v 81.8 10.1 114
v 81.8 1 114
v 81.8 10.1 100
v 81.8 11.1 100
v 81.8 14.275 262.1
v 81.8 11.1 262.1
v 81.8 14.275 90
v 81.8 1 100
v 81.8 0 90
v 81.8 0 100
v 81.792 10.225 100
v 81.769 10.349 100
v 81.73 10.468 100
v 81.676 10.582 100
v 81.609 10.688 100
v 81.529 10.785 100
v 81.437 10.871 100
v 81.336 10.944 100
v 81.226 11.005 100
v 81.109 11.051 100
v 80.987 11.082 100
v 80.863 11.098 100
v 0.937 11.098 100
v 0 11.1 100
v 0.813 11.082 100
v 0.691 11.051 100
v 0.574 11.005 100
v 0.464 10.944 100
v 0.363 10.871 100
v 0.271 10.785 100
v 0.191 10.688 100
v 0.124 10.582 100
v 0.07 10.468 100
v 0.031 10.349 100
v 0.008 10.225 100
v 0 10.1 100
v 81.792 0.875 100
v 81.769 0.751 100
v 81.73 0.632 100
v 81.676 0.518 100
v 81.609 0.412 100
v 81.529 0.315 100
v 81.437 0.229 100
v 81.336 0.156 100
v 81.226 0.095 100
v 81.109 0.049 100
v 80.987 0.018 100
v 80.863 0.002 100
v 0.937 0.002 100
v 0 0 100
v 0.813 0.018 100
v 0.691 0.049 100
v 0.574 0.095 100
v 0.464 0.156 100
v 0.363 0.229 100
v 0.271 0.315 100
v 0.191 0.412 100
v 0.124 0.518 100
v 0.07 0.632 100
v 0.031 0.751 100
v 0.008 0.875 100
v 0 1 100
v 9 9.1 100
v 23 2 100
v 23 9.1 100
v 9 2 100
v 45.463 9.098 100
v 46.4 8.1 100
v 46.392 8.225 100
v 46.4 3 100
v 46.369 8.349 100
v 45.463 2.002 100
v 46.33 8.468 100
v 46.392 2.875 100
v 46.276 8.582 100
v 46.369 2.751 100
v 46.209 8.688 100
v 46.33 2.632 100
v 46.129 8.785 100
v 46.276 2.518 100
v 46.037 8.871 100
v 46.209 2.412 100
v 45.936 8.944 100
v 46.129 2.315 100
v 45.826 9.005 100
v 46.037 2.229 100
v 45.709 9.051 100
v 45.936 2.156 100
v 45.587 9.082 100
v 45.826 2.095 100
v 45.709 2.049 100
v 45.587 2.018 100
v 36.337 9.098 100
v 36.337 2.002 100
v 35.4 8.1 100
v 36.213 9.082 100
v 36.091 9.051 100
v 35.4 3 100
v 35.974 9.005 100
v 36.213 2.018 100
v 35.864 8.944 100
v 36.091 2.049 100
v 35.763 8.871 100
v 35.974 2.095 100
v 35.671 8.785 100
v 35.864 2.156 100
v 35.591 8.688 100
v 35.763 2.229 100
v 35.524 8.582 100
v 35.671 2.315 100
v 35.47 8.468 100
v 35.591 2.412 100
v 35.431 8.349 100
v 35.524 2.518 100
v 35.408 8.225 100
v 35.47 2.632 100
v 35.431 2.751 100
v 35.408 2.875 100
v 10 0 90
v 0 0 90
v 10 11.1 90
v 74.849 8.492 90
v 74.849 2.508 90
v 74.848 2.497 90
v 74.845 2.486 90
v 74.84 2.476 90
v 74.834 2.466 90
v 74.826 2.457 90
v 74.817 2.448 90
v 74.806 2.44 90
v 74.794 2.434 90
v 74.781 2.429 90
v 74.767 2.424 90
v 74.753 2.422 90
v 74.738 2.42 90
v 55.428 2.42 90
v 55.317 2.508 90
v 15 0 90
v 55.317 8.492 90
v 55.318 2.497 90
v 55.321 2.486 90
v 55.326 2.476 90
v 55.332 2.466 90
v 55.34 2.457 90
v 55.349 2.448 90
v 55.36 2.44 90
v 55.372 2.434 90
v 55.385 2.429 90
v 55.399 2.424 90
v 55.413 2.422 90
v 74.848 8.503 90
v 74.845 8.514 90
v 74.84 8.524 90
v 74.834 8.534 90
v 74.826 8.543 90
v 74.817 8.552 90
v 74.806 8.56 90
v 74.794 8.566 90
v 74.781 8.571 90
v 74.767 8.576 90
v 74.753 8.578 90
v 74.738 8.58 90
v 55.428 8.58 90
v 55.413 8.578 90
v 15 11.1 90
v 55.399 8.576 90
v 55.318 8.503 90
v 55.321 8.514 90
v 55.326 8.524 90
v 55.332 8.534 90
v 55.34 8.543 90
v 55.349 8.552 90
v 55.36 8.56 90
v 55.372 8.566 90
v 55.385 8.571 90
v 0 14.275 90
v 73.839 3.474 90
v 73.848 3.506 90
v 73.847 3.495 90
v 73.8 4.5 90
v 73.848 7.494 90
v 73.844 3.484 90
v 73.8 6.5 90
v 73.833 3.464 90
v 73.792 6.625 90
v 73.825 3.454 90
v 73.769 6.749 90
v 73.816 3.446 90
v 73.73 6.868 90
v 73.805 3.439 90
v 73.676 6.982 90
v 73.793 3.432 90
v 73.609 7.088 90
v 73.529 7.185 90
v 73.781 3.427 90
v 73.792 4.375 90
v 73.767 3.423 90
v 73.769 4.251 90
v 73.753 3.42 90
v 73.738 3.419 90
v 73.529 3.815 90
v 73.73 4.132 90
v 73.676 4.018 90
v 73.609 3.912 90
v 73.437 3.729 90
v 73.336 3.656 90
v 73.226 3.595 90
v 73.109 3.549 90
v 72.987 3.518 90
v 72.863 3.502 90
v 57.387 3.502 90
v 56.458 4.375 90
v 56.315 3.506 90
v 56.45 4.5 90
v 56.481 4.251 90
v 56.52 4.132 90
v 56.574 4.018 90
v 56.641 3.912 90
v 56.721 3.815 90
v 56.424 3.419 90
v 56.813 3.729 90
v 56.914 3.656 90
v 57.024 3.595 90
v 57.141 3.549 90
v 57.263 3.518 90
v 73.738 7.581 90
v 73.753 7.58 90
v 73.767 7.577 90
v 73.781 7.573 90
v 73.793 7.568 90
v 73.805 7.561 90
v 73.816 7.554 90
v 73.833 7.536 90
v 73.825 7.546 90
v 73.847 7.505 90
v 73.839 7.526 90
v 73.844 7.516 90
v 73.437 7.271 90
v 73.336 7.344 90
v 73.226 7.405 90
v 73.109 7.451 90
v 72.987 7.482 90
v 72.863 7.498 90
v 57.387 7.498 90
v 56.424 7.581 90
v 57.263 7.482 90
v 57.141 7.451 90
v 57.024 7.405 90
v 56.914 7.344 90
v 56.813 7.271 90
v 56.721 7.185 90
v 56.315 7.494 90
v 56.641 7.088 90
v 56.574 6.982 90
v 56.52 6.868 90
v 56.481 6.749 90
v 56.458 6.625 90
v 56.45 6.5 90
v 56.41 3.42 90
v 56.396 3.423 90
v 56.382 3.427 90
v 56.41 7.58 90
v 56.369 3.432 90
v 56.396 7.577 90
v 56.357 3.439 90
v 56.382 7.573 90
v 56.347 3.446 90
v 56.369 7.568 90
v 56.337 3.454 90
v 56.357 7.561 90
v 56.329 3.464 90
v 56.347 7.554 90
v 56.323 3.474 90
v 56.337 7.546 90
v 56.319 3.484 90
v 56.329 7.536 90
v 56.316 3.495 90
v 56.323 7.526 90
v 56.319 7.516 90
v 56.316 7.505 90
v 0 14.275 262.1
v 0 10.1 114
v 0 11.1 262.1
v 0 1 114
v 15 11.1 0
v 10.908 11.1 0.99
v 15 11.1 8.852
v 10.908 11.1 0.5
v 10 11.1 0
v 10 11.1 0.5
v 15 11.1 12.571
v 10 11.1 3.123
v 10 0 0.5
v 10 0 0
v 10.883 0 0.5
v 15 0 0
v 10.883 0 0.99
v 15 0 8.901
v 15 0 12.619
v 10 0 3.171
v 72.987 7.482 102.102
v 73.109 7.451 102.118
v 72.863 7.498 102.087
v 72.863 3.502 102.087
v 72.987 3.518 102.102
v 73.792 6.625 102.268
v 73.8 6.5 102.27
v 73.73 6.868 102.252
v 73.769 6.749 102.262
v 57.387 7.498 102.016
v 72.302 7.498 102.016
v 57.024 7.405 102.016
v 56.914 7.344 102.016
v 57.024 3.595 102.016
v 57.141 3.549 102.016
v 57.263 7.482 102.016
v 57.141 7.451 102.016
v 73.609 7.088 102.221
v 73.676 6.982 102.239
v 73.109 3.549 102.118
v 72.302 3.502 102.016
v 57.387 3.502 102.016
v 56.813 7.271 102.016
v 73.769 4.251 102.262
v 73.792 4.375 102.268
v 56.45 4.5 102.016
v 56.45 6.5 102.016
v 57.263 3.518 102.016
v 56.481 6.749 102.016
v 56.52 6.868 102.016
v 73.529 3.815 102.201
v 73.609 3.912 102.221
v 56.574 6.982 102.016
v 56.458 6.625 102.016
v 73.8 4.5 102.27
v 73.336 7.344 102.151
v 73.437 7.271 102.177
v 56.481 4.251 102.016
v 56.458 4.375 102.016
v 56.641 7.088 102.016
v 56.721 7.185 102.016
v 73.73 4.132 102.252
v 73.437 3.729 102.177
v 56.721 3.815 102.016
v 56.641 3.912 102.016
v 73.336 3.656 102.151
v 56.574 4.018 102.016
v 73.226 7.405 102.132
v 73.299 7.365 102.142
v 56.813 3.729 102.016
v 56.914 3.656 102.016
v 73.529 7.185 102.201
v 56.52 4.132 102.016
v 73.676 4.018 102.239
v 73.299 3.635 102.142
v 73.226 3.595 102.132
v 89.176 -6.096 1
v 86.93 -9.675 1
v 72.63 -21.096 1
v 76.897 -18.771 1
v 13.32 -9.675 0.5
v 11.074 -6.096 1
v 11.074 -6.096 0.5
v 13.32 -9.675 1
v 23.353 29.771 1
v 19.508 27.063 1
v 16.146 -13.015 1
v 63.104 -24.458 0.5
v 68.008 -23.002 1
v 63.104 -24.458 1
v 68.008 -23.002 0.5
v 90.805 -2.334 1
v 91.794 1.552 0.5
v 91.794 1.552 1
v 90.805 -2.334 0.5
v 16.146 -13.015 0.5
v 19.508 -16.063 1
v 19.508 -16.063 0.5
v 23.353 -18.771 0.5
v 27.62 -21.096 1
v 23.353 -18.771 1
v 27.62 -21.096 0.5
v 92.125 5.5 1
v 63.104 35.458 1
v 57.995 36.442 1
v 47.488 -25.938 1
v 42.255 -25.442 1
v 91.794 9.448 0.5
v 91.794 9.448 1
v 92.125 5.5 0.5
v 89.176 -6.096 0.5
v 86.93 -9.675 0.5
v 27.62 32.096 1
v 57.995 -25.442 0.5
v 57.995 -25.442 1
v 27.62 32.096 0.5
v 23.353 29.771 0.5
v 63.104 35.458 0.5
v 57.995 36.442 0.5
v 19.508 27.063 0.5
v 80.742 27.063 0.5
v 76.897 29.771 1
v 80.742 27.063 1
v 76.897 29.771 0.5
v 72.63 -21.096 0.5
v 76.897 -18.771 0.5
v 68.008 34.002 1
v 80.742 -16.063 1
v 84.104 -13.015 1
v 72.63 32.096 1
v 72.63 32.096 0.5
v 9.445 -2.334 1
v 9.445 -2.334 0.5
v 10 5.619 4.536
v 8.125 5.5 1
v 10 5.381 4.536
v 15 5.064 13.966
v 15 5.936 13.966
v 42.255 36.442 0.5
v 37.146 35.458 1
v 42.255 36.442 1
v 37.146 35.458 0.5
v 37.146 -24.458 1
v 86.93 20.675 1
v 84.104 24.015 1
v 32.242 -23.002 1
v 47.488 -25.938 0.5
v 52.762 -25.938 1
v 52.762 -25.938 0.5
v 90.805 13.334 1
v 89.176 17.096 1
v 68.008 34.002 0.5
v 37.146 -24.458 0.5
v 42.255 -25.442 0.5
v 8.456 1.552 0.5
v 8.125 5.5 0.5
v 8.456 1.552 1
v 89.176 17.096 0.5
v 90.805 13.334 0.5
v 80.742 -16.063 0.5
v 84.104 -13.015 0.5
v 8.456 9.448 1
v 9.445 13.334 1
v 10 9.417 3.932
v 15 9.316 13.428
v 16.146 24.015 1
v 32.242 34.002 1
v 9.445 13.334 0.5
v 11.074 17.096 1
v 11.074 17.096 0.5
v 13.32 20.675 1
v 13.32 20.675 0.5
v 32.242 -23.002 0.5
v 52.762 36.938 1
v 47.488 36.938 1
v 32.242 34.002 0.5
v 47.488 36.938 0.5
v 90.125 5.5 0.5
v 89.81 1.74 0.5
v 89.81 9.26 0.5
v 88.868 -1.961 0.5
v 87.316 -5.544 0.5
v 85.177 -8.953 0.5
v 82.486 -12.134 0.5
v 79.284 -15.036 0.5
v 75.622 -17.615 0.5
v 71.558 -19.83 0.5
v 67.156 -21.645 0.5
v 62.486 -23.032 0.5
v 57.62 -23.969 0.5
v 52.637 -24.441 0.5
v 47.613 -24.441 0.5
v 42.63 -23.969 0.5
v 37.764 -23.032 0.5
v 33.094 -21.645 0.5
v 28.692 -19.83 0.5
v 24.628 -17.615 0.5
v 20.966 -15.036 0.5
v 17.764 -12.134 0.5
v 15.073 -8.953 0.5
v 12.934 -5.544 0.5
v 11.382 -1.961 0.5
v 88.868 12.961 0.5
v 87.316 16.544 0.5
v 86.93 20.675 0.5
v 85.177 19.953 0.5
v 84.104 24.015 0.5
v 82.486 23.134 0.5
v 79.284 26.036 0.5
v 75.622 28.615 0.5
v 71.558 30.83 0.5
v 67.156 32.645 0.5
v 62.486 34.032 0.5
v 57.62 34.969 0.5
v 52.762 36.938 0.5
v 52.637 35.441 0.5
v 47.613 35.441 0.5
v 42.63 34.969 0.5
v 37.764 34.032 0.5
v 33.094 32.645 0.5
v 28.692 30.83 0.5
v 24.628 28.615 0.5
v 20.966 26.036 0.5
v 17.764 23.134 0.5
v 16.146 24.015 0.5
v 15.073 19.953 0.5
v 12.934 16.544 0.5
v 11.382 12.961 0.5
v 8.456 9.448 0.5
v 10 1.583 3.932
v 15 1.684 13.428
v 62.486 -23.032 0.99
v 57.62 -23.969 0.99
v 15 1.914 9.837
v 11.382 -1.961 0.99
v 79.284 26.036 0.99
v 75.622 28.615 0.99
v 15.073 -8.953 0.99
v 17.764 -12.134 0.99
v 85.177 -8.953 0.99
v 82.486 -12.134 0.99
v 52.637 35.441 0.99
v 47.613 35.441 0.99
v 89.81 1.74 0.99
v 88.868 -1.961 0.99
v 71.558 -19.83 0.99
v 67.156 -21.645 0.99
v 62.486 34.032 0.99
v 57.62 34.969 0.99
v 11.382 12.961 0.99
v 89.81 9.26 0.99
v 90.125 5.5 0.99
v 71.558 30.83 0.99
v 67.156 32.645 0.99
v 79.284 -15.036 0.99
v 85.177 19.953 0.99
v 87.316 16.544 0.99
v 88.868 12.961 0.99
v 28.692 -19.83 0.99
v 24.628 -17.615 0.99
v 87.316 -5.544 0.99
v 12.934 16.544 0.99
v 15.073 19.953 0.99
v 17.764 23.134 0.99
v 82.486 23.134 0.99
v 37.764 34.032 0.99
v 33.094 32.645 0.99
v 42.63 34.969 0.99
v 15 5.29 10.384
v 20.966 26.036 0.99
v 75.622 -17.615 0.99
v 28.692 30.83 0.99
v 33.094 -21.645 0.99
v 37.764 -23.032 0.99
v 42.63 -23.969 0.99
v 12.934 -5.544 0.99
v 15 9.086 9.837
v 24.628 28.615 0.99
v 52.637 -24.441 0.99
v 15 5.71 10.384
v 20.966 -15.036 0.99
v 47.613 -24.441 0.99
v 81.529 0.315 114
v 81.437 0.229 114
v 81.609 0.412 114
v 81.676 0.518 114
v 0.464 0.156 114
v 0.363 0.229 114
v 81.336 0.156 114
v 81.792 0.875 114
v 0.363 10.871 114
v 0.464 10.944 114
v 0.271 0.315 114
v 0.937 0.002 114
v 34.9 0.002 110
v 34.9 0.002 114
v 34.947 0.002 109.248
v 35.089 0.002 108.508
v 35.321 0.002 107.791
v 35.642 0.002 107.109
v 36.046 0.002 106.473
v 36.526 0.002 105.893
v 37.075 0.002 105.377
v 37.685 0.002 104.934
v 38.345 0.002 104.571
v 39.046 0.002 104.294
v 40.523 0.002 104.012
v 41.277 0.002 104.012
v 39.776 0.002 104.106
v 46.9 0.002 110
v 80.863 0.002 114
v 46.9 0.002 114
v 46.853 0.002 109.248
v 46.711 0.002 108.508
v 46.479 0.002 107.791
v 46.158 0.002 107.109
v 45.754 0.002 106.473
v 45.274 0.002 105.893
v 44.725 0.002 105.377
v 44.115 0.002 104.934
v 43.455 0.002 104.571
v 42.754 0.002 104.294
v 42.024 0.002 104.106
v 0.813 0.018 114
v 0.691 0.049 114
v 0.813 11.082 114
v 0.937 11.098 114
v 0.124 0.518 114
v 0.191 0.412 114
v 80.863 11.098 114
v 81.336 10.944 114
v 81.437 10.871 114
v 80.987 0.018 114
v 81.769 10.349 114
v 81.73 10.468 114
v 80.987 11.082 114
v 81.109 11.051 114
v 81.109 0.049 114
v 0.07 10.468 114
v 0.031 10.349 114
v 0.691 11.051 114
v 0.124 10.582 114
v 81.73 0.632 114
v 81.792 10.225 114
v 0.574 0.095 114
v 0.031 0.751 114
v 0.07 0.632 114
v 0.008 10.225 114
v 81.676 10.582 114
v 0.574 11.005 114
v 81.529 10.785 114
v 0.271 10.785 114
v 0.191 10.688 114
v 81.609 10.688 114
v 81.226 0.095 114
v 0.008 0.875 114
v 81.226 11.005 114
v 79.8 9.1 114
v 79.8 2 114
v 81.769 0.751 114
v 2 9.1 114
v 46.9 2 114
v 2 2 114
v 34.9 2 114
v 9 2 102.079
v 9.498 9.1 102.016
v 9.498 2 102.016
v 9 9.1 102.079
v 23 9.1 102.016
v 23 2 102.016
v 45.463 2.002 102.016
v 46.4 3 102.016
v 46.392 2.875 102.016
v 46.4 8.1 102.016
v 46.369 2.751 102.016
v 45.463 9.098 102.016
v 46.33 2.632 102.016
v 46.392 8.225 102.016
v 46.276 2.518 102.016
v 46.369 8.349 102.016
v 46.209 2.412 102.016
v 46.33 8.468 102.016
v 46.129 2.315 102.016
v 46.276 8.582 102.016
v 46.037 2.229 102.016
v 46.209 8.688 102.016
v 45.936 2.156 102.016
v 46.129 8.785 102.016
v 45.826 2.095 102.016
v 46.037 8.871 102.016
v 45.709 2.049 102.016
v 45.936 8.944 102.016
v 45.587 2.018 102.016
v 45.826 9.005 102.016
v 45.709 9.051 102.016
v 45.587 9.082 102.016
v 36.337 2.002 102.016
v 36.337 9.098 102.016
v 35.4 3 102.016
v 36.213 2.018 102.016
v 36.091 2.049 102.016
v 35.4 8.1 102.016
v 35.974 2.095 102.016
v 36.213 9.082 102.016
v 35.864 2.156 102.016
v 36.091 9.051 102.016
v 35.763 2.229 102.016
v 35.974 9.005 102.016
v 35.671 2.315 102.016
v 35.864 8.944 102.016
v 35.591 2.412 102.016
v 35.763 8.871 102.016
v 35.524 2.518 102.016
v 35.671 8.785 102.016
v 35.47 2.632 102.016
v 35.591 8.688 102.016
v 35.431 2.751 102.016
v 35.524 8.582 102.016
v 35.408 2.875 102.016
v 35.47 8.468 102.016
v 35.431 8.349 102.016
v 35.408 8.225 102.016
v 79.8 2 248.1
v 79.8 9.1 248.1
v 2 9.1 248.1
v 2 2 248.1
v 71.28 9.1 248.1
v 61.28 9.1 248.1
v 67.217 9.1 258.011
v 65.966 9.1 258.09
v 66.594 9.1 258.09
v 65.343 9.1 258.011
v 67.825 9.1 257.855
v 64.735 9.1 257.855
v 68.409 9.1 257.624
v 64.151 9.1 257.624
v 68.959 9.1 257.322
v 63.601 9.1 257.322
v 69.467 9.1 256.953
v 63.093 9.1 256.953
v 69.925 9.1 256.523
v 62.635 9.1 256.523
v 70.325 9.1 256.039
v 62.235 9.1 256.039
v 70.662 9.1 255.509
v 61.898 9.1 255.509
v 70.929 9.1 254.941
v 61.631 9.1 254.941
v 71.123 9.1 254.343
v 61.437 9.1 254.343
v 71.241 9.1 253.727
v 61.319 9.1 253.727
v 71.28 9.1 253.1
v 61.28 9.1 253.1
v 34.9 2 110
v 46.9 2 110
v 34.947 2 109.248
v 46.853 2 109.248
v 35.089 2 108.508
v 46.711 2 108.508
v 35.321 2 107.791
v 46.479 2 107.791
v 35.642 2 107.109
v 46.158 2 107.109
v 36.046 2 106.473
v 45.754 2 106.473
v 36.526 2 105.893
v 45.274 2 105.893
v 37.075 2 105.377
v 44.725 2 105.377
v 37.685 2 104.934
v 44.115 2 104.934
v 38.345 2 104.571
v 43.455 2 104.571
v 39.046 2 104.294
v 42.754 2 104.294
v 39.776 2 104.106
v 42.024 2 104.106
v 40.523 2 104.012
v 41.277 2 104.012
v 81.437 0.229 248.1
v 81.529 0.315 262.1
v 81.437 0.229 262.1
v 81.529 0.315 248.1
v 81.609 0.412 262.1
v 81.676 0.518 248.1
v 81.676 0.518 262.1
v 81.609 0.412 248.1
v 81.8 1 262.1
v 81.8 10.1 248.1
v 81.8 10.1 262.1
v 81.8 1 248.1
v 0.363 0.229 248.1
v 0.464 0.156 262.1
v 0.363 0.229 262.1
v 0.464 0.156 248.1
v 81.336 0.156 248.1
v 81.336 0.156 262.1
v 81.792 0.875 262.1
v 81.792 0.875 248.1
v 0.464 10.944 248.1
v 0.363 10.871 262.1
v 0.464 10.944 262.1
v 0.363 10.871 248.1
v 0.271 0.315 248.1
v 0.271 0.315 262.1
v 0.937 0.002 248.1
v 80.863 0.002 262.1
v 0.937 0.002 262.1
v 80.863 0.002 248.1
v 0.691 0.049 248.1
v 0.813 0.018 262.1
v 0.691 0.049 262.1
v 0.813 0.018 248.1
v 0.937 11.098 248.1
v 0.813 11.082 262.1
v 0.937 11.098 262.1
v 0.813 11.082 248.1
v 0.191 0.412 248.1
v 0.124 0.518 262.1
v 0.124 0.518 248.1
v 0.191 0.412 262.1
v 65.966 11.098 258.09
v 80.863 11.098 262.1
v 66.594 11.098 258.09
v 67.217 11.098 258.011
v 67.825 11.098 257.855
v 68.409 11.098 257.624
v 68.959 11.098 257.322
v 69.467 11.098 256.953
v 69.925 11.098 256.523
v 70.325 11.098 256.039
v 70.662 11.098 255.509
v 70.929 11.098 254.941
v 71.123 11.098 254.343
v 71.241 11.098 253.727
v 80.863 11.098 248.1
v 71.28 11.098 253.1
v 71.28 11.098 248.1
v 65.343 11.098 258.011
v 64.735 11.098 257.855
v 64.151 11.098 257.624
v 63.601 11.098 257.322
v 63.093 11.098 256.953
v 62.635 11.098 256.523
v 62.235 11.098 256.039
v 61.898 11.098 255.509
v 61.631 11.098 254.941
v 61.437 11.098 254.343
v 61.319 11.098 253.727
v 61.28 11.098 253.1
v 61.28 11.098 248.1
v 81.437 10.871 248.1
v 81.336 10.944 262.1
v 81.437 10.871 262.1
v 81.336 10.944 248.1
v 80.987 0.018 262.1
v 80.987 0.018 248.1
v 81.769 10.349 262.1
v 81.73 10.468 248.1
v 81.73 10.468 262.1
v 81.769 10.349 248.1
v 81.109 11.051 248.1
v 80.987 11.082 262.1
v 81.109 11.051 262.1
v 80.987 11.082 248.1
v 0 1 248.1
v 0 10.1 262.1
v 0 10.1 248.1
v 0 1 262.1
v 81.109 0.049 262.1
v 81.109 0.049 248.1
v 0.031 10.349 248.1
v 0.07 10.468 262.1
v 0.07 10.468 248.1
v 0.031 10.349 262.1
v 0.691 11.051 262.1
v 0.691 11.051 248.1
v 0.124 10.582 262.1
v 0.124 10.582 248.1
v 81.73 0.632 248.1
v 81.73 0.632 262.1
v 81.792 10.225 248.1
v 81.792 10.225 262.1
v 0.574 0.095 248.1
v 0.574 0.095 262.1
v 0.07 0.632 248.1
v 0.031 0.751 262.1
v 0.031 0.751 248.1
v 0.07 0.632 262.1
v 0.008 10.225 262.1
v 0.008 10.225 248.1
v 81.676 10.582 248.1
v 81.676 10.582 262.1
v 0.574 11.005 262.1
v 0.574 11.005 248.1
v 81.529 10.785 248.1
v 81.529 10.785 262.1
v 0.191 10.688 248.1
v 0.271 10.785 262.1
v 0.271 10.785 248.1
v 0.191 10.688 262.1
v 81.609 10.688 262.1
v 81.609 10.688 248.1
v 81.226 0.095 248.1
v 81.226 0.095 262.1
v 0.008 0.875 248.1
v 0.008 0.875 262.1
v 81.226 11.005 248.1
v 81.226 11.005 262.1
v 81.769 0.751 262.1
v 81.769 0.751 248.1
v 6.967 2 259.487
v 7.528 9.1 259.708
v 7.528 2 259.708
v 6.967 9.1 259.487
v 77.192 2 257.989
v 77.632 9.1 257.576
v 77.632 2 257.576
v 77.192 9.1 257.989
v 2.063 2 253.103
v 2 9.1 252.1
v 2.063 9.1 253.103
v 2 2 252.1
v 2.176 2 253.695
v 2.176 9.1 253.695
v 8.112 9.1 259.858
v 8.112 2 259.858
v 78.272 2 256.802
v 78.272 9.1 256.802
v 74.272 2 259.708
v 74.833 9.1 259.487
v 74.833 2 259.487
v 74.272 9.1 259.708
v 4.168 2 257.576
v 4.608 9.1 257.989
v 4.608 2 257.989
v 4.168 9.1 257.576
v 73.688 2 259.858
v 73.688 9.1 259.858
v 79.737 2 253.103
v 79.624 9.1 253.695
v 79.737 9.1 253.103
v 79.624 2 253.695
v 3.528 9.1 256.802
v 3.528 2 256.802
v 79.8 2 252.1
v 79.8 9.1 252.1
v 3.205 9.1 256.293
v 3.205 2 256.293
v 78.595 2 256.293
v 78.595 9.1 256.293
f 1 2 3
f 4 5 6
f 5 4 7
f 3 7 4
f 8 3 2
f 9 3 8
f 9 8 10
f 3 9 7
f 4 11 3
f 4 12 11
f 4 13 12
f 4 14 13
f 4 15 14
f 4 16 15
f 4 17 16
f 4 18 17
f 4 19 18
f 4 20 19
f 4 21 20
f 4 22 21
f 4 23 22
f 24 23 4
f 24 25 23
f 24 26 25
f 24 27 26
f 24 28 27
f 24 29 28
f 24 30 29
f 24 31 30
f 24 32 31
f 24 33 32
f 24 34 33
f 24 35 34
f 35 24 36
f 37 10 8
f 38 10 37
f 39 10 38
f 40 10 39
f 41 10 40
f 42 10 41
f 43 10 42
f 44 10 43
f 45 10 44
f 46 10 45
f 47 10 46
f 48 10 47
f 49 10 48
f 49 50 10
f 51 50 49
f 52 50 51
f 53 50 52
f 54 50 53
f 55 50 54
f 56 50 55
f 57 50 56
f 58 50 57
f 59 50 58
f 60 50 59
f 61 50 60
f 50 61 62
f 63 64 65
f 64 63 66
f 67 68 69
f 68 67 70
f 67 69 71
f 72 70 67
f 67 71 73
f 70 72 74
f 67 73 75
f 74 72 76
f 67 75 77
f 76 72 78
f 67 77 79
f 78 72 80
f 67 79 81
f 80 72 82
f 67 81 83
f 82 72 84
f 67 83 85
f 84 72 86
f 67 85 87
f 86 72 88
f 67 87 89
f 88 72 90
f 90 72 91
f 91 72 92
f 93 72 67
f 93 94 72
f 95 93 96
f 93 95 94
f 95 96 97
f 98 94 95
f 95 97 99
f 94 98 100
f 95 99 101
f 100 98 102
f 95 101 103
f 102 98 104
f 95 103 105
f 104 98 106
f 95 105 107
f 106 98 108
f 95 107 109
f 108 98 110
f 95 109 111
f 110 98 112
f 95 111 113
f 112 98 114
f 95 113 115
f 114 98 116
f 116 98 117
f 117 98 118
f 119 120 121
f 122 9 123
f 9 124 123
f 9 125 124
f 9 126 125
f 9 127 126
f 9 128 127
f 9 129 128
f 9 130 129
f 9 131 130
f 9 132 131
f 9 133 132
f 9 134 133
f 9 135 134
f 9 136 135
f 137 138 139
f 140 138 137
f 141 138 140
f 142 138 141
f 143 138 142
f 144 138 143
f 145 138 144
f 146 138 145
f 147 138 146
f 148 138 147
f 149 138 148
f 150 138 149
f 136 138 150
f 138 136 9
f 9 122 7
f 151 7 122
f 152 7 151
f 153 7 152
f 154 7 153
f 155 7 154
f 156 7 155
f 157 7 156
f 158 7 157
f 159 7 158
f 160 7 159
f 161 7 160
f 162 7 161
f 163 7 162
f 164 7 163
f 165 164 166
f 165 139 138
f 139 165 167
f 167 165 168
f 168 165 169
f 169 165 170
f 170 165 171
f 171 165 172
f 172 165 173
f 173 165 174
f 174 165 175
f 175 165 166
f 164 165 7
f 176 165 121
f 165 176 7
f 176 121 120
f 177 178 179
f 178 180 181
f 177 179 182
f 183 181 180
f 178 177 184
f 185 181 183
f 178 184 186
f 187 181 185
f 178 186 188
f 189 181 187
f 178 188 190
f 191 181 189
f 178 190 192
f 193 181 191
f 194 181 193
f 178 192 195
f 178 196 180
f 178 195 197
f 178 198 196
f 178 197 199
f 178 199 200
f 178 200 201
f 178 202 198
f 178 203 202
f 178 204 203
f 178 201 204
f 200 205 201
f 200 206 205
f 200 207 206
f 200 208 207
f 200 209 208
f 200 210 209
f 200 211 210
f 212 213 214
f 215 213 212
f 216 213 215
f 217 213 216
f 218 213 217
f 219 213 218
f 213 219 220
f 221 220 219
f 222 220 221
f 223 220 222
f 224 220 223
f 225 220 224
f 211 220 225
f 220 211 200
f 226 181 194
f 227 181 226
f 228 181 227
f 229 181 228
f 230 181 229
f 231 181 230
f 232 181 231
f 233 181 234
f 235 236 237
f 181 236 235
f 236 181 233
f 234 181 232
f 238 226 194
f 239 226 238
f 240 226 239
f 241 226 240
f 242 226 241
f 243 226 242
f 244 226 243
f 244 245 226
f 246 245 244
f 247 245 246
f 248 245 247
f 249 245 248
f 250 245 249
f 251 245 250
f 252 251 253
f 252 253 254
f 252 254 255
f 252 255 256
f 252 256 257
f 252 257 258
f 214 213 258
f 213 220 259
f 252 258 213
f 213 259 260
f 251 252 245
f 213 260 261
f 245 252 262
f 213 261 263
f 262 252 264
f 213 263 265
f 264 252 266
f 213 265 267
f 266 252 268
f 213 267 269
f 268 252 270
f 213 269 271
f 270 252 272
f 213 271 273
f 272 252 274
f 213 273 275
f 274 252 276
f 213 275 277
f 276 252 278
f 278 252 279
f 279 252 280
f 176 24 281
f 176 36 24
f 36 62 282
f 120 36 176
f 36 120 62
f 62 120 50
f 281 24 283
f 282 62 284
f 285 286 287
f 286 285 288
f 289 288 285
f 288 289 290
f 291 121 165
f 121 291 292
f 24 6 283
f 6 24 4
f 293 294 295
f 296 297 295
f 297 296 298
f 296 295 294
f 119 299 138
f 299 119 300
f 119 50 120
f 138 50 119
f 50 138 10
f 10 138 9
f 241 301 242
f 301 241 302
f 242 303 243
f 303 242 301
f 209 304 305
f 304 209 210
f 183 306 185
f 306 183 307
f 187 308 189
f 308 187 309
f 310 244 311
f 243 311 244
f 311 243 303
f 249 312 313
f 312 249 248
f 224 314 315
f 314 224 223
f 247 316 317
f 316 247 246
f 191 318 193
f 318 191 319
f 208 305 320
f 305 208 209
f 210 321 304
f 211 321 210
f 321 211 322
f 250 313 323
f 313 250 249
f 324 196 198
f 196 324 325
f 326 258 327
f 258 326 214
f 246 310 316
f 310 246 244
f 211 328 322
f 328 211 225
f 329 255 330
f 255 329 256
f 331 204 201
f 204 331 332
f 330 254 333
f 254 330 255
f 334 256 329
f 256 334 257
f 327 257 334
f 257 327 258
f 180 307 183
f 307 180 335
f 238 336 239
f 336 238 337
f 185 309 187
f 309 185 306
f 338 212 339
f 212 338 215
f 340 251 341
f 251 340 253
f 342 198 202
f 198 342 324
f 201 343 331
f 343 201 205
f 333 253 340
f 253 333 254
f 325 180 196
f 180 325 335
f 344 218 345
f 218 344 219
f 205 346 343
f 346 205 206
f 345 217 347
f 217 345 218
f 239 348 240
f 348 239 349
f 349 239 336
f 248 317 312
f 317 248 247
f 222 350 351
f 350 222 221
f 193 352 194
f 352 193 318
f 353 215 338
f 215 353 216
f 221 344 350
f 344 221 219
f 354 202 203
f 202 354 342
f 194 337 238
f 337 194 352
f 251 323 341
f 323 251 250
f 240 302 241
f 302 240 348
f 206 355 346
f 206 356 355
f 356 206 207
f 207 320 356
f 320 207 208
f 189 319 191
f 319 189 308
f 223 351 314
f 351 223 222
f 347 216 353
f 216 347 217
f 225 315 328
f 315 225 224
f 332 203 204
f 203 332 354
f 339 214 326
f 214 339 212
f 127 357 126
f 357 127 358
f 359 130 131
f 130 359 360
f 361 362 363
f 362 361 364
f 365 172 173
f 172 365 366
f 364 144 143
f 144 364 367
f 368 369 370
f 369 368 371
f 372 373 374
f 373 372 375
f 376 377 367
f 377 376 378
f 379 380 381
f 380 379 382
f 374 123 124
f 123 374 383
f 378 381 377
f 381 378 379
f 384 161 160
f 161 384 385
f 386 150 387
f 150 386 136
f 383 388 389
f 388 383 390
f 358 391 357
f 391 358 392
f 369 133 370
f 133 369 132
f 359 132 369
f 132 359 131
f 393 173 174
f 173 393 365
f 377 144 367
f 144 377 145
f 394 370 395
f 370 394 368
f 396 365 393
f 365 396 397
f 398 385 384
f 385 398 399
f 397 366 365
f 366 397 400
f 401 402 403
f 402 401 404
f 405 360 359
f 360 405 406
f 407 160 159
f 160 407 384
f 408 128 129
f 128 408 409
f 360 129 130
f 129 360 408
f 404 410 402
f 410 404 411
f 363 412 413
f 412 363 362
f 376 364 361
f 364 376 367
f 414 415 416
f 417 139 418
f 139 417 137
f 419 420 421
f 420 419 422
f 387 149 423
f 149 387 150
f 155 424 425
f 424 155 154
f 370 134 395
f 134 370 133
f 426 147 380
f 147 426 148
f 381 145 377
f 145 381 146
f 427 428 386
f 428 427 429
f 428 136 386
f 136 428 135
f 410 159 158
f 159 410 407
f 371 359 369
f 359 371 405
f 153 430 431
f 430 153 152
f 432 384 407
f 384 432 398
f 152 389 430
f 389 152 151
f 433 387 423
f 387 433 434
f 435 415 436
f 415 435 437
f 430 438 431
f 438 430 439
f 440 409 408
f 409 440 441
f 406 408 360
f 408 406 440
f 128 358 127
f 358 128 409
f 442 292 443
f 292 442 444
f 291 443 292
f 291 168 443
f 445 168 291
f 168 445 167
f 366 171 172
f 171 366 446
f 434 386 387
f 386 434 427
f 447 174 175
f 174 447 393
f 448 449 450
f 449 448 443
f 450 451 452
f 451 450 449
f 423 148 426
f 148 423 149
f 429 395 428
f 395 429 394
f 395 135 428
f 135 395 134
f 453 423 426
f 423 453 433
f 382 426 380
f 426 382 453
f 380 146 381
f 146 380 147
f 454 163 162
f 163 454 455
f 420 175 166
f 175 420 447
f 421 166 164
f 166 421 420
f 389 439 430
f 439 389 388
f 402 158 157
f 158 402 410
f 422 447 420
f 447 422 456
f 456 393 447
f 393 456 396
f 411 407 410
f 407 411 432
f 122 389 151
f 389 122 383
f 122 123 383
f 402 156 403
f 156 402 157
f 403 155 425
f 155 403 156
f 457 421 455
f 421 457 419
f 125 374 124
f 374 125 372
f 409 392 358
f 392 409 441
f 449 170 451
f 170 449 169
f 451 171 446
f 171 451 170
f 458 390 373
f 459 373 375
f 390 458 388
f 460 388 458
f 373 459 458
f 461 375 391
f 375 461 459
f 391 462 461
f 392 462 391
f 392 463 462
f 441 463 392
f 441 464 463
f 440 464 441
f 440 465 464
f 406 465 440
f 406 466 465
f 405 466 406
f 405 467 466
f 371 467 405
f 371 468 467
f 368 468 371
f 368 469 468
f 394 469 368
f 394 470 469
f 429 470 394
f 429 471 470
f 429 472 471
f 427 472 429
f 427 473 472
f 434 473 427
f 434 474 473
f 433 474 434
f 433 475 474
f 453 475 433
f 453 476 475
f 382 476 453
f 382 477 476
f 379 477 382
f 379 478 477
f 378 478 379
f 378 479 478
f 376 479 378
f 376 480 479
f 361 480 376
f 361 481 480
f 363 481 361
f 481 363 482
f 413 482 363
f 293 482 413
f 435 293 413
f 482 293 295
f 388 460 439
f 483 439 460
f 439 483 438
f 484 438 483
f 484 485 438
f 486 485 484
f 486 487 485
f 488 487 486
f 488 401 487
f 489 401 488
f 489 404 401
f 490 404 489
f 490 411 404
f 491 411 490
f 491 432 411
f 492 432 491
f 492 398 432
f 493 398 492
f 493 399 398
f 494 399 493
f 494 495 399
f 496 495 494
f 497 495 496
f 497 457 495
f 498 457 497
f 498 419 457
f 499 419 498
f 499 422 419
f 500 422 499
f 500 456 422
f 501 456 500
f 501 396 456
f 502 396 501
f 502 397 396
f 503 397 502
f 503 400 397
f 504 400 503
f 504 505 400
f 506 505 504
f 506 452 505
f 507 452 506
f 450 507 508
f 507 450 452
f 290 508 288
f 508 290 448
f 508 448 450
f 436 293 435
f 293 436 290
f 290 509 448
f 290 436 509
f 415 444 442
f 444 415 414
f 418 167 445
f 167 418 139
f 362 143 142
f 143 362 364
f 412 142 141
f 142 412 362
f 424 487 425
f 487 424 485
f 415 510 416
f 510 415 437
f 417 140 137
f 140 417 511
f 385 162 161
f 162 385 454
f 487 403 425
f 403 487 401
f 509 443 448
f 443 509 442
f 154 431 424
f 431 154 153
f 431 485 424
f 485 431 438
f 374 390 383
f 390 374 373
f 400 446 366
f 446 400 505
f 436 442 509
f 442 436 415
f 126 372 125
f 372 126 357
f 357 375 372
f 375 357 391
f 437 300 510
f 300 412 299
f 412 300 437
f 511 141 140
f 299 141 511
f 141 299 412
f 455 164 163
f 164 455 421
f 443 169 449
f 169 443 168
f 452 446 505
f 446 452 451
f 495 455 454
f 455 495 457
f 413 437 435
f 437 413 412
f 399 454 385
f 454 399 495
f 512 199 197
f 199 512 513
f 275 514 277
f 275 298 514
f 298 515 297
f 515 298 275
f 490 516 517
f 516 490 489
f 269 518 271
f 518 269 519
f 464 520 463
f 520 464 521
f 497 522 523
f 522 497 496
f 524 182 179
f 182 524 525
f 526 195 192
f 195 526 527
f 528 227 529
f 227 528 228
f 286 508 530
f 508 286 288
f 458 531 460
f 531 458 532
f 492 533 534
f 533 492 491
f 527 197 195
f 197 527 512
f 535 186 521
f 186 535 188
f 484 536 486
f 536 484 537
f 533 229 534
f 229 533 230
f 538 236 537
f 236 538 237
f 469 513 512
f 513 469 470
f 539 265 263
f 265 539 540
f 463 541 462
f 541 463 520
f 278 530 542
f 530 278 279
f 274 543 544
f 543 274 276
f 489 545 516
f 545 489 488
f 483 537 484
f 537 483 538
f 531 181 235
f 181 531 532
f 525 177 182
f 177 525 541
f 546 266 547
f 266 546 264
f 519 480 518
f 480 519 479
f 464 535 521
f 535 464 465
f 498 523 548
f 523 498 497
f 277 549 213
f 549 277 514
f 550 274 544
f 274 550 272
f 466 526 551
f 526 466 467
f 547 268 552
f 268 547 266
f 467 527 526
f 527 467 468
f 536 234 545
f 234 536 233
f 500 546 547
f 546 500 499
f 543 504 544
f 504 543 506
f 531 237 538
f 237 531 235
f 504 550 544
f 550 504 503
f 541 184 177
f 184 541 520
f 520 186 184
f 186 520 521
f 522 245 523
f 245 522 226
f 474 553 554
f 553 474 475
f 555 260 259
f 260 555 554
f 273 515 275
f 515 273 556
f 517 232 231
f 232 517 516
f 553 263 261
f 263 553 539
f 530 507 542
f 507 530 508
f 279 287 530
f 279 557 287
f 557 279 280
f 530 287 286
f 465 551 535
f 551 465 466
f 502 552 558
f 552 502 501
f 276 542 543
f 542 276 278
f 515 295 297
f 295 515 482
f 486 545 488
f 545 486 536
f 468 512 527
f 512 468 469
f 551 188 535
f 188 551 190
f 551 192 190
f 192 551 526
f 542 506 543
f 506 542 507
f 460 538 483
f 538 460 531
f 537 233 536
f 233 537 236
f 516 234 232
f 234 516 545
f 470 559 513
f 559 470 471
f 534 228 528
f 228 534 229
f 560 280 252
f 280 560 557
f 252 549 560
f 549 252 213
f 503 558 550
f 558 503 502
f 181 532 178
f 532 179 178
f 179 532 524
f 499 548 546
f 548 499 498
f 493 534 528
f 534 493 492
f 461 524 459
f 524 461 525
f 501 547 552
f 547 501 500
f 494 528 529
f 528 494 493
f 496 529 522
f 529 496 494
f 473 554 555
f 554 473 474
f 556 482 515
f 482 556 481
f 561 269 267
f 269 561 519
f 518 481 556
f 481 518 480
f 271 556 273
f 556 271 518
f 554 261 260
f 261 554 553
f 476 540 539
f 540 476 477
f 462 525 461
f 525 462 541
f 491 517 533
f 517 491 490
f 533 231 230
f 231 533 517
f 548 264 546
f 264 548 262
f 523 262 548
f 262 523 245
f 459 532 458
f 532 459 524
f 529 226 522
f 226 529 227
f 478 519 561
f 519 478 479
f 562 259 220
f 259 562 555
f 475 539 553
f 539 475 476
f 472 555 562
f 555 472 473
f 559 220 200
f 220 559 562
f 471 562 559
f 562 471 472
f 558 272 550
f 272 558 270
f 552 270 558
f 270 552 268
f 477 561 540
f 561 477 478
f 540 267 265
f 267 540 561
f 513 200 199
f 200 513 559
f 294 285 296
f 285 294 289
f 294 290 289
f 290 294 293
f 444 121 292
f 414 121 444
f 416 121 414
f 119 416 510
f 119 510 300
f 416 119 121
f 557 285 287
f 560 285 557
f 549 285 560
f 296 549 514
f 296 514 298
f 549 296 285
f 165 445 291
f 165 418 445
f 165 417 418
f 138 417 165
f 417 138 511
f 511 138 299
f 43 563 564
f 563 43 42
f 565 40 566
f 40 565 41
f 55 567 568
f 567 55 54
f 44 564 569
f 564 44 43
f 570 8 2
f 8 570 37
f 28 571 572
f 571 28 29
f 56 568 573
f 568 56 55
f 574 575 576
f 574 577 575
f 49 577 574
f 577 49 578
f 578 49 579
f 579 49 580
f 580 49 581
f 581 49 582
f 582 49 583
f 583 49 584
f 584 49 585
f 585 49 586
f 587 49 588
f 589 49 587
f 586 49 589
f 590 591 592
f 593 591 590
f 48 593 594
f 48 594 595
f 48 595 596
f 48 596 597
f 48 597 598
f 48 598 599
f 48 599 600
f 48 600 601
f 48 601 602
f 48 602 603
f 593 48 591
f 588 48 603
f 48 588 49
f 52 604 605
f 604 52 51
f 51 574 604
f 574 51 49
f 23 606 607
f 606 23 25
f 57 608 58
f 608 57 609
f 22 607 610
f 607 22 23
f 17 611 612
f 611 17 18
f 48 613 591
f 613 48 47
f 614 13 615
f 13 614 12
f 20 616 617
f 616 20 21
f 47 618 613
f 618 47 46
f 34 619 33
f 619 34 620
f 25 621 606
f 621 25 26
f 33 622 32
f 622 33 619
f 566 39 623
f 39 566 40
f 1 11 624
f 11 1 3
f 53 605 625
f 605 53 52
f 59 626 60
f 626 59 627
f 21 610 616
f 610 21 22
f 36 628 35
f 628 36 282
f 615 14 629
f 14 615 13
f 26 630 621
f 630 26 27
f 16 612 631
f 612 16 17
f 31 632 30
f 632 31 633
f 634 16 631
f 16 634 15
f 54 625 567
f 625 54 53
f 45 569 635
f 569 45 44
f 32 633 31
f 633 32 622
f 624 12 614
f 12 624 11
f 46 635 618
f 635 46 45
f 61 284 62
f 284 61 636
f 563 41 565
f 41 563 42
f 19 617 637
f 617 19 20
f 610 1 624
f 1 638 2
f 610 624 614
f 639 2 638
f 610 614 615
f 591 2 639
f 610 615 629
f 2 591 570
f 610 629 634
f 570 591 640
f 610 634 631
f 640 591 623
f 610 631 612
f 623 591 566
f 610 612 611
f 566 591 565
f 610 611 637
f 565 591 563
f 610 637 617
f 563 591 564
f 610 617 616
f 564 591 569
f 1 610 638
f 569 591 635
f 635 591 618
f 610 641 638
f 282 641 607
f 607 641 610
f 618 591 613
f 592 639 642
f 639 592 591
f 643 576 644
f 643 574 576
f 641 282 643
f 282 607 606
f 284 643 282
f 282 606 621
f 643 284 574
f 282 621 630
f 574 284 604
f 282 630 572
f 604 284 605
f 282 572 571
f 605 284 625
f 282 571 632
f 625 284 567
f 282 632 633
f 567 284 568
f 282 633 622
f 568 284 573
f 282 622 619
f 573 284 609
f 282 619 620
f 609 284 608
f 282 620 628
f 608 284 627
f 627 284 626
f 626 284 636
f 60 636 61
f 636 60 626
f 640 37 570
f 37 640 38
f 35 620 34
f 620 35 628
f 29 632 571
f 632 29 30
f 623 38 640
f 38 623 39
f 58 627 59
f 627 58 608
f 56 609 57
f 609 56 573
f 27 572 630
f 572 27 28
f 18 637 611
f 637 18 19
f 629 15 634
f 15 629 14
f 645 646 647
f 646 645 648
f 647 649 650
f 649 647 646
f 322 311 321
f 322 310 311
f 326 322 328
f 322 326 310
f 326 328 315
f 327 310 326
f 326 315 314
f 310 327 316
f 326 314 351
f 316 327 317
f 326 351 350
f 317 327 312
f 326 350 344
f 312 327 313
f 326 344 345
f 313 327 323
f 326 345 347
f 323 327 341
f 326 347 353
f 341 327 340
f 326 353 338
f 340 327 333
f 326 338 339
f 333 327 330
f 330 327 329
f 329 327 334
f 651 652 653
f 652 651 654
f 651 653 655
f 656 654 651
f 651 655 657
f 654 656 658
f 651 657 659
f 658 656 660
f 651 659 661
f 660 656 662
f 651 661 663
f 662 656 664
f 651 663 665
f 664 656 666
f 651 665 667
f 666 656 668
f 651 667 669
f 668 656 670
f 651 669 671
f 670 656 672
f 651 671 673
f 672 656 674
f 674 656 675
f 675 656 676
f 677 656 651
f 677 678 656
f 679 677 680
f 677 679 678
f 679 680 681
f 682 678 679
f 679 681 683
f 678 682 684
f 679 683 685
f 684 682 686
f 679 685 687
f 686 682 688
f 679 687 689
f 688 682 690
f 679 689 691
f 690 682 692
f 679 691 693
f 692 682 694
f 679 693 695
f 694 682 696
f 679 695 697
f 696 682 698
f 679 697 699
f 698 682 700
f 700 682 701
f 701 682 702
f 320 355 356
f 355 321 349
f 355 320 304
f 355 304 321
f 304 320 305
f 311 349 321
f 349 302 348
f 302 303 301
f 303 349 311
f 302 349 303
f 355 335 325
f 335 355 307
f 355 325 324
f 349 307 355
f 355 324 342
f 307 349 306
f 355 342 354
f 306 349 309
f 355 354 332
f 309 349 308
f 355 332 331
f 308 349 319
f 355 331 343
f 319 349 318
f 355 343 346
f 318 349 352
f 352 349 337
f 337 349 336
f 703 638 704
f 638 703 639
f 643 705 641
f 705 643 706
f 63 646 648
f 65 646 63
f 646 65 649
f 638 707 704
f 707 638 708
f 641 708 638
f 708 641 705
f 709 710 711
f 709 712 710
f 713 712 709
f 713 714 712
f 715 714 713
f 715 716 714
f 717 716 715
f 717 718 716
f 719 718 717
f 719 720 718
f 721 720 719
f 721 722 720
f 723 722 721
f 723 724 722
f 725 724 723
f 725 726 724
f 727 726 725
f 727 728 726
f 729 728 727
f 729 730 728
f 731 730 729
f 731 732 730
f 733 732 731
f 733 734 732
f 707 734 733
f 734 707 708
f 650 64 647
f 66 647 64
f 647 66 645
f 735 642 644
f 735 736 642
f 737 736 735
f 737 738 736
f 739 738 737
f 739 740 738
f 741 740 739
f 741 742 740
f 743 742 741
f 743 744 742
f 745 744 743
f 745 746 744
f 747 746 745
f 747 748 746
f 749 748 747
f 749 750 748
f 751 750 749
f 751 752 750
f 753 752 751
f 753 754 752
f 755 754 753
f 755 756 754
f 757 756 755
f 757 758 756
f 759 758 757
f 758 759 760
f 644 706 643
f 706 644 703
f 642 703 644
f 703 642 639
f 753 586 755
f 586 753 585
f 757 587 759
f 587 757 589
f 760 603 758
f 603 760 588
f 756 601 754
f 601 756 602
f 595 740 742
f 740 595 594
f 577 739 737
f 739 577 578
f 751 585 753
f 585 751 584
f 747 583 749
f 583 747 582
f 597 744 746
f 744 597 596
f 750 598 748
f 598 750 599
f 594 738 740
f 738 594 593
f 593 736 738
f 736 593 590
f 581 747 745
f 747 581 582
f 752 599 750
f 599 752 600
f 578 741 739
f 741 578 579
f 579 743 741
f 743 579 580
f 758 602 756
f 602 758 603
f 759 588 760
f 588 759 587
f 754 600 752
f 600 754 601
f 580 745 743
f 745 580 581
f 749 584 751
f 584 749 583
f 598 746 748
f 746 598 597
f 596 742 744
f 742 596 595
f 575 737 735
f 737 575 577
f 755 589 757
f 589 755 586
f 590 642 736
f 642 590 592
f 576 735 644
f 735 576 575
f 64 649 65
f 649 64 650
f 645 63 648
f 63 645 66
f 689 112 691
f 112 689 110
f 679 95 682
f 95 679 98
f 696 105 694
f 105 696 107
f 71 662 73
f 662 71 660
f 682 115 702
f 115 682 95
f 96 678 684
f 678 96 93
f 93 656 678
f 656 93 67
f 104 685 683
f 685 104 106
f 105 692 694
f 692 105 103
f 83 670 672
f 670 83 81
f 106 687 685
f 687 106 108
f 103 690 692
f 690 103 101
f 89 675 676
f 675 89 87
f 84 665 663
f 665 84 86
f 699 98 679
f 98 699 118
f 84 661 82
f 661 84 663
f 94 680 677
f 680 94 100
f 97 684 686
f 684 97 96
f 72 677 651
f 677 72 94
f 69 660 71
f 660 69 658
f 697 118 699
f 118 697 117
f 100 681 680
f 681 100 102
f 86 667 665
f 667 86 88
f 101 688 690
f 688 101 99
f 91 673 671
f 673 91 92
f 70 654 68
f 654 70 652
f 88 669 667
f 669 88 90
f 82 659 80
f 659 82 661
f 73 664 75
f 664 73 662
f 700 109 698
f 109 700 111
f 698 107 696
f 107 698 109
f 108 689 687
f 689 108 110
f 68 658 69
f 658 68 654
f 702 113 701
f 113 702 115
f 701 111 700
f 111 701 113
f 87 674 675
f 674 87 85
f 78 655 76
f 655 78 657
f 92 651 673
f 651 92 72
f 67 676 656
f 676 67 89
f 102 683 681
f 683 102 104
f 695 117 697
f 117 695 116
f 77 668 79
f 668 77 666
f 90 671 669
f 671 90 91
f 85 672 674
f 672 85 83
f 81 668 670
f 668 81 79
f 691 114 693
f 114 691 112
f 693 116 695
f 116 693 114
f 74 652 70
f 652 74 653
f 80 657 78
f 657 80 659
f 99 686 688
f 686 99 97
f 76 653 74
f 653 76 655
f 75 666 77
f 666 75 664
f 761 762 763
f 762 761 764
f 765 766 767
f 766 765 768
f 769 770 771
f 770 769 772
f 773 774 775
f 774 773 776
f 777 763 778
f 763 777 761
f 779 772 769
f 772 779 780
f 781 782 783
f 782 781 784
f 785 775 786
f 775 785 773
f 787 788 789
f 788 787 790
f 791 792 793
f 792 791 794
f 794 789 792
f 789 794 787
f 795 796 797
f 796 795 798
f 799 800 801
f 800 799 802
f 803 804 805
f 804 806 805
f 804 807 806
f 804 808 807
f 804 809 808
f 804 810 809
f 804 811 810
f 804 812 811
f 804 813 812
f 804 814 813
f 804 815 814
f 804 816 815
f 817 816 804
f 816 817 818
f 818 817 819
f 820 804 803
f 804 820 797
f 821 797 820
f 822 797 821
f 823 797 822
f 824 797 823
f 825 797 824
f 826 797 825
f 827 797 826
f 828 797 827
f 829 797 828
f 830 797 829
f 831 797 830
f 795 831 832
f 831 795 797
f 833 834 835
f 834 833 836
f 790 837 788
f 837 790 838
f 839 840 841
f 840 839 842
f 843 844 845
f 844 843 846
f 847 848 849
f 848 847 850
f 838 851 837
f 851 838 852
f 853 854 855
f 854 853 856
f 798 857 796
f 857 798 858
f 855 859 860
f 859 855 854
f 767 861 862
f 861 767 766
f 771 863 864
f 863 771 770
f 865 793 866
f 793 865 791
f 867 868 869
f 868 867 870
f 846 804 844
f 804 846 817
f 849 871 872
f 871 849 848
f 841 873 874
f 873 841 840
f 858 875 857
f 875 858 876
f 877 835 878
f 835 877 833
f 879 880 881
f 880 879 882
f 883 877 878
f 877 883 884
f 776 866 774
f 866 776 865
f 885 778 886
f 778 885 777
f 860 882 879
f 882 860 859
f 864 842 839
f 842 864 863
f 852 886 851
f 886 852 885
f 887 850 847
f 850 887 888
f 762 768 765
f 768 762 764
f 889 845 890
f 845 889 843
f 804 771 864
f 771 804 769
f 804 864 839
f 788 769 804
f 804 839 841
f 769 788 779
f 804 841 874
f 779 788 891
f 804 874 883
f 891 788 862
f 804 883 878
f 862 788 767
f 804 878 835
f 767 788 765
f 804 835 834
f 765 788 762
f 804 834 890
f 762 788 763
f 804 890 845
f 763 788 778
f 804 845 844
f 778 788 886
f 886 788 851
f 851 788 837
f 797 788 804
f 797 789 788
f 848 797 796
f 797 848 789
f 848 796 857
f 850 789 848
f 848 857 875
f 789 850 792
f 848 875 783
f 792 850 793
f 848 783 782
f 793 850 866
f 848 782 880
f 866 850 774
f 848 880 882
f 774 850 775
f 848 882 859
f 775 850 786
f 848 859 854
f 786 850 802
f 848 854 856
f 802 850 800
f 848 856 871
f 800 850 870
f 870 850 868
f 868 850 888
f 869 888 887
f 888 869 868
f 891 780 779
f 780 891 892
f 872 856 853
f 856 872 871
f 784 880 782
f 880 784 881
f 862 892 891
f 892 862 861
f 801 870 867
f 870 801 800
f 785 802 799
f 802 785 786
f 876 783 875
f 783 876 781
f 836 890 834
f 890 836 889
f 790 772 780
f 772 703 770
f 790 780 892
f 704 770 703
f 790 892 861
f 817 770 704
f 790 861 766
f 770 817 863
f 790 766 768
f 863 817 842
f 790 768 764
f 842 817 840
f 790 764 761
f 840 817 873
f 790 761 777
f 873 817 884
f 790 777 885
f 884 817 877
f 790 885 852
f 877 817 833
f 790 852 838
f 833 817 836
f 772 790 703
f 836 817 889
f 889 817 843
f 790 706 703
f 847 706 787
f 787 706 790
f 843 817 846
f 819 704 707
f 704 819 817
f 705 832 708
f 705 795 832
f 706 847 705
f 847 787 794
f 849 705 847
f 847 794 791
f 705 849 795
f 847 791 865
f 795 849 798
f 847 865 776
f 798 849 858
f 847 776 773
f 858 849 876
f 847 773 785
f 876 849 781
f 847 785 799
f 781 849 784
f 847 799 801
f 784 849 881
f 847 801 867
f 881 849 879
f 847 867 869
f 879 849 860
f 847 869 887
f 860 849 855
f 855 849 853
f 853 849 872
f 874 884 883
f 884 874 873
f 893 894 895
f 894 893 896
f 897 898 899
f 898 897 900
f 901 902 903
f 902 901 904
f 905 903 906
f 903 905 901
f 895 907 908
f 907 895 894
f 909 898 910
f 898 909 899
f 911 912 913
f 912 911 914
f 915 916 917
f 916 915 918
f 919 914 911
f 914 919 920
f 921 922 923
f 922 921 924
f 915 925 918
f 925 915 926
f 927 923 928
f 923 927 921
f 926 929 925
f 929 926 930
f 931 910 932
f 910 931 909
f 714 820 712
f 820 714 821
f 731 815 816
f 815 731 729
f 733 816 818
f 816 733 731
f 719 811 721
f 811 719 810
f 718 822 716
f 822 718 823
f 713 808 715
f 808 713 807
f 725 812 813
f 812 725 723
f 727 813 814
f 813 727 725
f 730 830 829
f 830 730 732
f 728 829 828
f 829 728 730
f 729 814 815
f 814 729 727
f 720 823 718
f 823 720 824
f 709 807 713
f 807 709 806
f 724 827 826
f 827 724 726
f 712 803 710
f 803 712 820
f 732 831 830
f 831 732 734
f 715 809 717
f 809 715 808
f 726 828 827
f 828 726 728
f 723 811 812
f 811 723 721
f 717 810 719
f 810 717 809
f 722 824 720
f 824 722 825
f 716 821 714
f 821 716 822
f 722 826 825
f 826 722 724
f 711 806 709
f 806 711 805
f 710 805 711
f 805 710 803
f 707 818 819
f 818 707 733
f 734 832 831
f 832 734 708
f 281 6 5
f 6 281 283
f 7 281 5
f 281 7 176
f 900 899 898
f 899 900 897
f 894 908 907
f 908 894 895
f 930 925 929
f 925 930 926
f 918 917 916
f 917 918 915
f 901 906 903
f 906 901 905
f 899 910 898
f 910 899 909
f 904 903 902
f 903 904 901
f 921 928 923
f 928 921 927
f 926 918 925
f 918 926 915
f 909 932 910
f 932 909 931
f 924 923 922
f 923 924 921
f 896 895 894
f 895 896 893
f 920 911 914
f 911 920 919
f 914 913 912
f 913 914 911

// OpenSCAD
// file: ../lib/basics.scad
// ## `basics.scad`
// This library contains basic elements to construct mobile device augmentations.

// ### `roundedCube(dimension,edgeRadius)`
// A cube with rounded edges on the depth axis. This function is helpful for creating simple phone shapes.
// #### Where
// * `dimension=[width,depth,height]`: the size of the cube
// * `edgeRadius`: the radius of the rounded edges 
module roundedCube(dimension=[10,10,10],edgeRadius=1){
    translate([0,dimension[1],0])
		rotate([90,0,0])
			hull(){
        		translate([edgeRadius,edgeRadius,0])
					cylinder(r=edgeRadius,h=dimension[1]);
        		translate([dimension[0]-edgeRadius,edgeRadius,0])
					cylinder(r=edgeRadius,h=dimension[1]);
        		translate([edgeRadius,dimension[2]-edgeRadius,0])
					cylinder(r=edgeRadius,h=dimension[1]);
        		translate([dimension[0]-edgeRadius,dimension[2]-edgeRadius,0])
					cylinder(r=edgeRadius,h=dimension[1]);
    		}
}

// ### `bottomHolder(deviceWidth,deviceDepth,deviceEdgeRadius,deviceHeightInHolder,wallThickness,holderEdgeRadius)`
// A basic generic element to hold the bottom part of a device
// #### Where
// * `deviceWidth`: the width of the device to be held
// * `deviceDepth`: the depth of the device to be held
// * `deviceEdgeRadius`: the edge radius of the device to be held
// * `deviceHeightInHolder`: the height of the part of the holder covering the device
// * `wallThickness`: the holder's wall thickness
// * `holderEdgeRadius`: the holder's edge radius
module bottomHolder(deviceWidth=10,deviceDepth=10,deviceEdgeRadius=1,
deviceHeightInHolder=10,wallThickness=1,holderEdgeRadius=1){
	difference(){
		translate([0,deviceDepth+wallThickness*2,0])
			rotate([90,0,0])
				roundedCube([deviceWidth+wallThickness*2,deviceHeightInHolder+wallThickness,
				deviceDepth+wallThickness*2],holderEdgeRadius);
		translate([wallThickness,wallThickness,wallThickness])
			roundedCube([deviceWidth,deviceDepth,
			deviceHeightInHolder+deviceEdgeRadius],deviceEdgeRadius);
	}
}

// ### `topHolder(deviceWidth,deviceDepth,deviceEdgeRadius,deviceHeightInHolder,wallThickness,lipsWidth,holderEdgeRadius)`
// A basic generic element to hold the top part of a device
// #### Where
// * `deviceWidth`: the width of the device to be held
// * `deviceDepth`: the depth of the device to be held
// * `deviceEdgeRadius`: the edge radius of the device to be held
// * `deviceHeightInHolder`: the height of the part of the holder covering the device
// * `wallThickness`: the holder's wall thickness
// * `lipsWidth`: size of the lips holding the device
// * `holderEdgeRadius`: the holder's edge radius
module topHolder(deviceWidth=10,deviceDepth=10,deviceEdgeRadius=1,deviceHeightInHolder=10,
wallThickness=1,lipsWidth=2,holderEdgeRadius=1){
	difference(){
		translate([0,deviceDepth+wallThickness*2,0])rotate([90,0,0])
			roundedCube([deviceWidth+wallThickness*2,deviceHeightInHolder+wallThickness,
			deviceDepth+wallThickness*2],holderEdgeRadius);
		translate([wallThickness,wallThickness,-wallThickness*2])
			roundedCube([deviceWidth,deviceDepth,deviceHeightInHolder],deviceEdgeRadius);
		//translate([wallThickness+lipsWidth,-0.01,-wallThickness-lipsWidth-0.85]) // TODO: 0.85 wrong here: needs to be fixed
		//	roundedCube([deviceWidth-lipsWidth*2,wallThickness+0.02,deviceHeightInHolder],
	//		deviceEdgeRadius*((deviceWidth-lipsWidth*2)/deviceWidth));
	}
}

// ### `rectangleCircularHorn(rectangleWidth,rectangleHeight,circleRadius,hornLength,wallThickness,hornDeformationFactor,hornDerivation,endsHeight)`
// A horn with a square termination on one side and a circle termination on the other.
// #### Where
// * `rectangleWidth`: the width of the rectangular termination
// * `rectangleHeight`: the height of the rectangular termination
// * `circleRadius`: the radius of the circular termination
// * `hornLength`: the length of the horn
// * `wallThickness`: the thickness of the walls
// * `hornDeformationFactor`: controls the vertical flatness of the horn with (1=perfect circle, >1=flatened circle) 
// * `hornDerivation`: displace the position of the circular end relatively to the rectangular end on the horizontal axis
// * `endsHeight`: the height of the two ends
module rectangleCircularHorn(rectangleWidth=10,rectangleHeight=10,circleRadius=10,hornLength=10,wallThickness=1,
hornDeformationFactor=1,hornDerivation=0,endsHeight=0.5){
	difference(){
		hull(){
			cube([rectangleWidth+wallThickness,rectangleHeight+wallThickness,endsHeight],center=true);
			translate([hornDerivation,0,hornLength-endsHeight*2])
				scale([1,hornDeformationFactor,1])
					cylinder(r=circleRadius+wallThickness,h=endsHeight);
		}
		hull(){
			translate([0,0,-0.01])
				cube([rectangleWidth,rectangleHeight,endsHeight],center=true);
			translate([hornDerivation,0,hornLength-endsHeight*2+0.01])
				scale([1,hornDeformationFactor,1])
					cylinder(r=circleRadius,h=endsHeight);
		}
	}
}

// ### `halfSphere(radius)`
// A half sphere useful to create tops.
// #### Where
// * `radius`: the radius of the half sphere
module halfSphere(radius=10){
	difference(){
		translate([radius,radius,0])sphere(radius);
		translate([0,0,-radius*2])cube([radius*2,radius*2,radius*2]);
	}
}

// ### `halfCylinder(dimension=[10,10,10])`
// A half cylinder with controllable height.
// #### Where
// * `dimension=[width,depth,height]`: the size of the half cylinder
module halfCylinder(dimension=[10,10,10]){
	rotate([-90,0,0])scale([1,dimension[2]/dimension[0],1])difference(){
		translate([dimension[0]/2,0,0.01])cylinder(r=dimension[0]/2,h=dimension[1]);
		cube([dimension[0],dimension[0],dimension[1]+0.02]);
	}
}
// main file
include <../lib/iPhone6Plus.scad>

$fn=50;

iPhone6Plus_CaseWithLargePassiveAmp();
translate([iPhone6Plus_Module_WallThickness,iPhone6Plus_Module_WallThickness,iPhone6Plus_Module_WallThickness+iPhone6Plus_LargePassiveAmp_HornLength+iPhone6Plus_LargePassiveAmp_BaseThickness])iPhone6Plus();
